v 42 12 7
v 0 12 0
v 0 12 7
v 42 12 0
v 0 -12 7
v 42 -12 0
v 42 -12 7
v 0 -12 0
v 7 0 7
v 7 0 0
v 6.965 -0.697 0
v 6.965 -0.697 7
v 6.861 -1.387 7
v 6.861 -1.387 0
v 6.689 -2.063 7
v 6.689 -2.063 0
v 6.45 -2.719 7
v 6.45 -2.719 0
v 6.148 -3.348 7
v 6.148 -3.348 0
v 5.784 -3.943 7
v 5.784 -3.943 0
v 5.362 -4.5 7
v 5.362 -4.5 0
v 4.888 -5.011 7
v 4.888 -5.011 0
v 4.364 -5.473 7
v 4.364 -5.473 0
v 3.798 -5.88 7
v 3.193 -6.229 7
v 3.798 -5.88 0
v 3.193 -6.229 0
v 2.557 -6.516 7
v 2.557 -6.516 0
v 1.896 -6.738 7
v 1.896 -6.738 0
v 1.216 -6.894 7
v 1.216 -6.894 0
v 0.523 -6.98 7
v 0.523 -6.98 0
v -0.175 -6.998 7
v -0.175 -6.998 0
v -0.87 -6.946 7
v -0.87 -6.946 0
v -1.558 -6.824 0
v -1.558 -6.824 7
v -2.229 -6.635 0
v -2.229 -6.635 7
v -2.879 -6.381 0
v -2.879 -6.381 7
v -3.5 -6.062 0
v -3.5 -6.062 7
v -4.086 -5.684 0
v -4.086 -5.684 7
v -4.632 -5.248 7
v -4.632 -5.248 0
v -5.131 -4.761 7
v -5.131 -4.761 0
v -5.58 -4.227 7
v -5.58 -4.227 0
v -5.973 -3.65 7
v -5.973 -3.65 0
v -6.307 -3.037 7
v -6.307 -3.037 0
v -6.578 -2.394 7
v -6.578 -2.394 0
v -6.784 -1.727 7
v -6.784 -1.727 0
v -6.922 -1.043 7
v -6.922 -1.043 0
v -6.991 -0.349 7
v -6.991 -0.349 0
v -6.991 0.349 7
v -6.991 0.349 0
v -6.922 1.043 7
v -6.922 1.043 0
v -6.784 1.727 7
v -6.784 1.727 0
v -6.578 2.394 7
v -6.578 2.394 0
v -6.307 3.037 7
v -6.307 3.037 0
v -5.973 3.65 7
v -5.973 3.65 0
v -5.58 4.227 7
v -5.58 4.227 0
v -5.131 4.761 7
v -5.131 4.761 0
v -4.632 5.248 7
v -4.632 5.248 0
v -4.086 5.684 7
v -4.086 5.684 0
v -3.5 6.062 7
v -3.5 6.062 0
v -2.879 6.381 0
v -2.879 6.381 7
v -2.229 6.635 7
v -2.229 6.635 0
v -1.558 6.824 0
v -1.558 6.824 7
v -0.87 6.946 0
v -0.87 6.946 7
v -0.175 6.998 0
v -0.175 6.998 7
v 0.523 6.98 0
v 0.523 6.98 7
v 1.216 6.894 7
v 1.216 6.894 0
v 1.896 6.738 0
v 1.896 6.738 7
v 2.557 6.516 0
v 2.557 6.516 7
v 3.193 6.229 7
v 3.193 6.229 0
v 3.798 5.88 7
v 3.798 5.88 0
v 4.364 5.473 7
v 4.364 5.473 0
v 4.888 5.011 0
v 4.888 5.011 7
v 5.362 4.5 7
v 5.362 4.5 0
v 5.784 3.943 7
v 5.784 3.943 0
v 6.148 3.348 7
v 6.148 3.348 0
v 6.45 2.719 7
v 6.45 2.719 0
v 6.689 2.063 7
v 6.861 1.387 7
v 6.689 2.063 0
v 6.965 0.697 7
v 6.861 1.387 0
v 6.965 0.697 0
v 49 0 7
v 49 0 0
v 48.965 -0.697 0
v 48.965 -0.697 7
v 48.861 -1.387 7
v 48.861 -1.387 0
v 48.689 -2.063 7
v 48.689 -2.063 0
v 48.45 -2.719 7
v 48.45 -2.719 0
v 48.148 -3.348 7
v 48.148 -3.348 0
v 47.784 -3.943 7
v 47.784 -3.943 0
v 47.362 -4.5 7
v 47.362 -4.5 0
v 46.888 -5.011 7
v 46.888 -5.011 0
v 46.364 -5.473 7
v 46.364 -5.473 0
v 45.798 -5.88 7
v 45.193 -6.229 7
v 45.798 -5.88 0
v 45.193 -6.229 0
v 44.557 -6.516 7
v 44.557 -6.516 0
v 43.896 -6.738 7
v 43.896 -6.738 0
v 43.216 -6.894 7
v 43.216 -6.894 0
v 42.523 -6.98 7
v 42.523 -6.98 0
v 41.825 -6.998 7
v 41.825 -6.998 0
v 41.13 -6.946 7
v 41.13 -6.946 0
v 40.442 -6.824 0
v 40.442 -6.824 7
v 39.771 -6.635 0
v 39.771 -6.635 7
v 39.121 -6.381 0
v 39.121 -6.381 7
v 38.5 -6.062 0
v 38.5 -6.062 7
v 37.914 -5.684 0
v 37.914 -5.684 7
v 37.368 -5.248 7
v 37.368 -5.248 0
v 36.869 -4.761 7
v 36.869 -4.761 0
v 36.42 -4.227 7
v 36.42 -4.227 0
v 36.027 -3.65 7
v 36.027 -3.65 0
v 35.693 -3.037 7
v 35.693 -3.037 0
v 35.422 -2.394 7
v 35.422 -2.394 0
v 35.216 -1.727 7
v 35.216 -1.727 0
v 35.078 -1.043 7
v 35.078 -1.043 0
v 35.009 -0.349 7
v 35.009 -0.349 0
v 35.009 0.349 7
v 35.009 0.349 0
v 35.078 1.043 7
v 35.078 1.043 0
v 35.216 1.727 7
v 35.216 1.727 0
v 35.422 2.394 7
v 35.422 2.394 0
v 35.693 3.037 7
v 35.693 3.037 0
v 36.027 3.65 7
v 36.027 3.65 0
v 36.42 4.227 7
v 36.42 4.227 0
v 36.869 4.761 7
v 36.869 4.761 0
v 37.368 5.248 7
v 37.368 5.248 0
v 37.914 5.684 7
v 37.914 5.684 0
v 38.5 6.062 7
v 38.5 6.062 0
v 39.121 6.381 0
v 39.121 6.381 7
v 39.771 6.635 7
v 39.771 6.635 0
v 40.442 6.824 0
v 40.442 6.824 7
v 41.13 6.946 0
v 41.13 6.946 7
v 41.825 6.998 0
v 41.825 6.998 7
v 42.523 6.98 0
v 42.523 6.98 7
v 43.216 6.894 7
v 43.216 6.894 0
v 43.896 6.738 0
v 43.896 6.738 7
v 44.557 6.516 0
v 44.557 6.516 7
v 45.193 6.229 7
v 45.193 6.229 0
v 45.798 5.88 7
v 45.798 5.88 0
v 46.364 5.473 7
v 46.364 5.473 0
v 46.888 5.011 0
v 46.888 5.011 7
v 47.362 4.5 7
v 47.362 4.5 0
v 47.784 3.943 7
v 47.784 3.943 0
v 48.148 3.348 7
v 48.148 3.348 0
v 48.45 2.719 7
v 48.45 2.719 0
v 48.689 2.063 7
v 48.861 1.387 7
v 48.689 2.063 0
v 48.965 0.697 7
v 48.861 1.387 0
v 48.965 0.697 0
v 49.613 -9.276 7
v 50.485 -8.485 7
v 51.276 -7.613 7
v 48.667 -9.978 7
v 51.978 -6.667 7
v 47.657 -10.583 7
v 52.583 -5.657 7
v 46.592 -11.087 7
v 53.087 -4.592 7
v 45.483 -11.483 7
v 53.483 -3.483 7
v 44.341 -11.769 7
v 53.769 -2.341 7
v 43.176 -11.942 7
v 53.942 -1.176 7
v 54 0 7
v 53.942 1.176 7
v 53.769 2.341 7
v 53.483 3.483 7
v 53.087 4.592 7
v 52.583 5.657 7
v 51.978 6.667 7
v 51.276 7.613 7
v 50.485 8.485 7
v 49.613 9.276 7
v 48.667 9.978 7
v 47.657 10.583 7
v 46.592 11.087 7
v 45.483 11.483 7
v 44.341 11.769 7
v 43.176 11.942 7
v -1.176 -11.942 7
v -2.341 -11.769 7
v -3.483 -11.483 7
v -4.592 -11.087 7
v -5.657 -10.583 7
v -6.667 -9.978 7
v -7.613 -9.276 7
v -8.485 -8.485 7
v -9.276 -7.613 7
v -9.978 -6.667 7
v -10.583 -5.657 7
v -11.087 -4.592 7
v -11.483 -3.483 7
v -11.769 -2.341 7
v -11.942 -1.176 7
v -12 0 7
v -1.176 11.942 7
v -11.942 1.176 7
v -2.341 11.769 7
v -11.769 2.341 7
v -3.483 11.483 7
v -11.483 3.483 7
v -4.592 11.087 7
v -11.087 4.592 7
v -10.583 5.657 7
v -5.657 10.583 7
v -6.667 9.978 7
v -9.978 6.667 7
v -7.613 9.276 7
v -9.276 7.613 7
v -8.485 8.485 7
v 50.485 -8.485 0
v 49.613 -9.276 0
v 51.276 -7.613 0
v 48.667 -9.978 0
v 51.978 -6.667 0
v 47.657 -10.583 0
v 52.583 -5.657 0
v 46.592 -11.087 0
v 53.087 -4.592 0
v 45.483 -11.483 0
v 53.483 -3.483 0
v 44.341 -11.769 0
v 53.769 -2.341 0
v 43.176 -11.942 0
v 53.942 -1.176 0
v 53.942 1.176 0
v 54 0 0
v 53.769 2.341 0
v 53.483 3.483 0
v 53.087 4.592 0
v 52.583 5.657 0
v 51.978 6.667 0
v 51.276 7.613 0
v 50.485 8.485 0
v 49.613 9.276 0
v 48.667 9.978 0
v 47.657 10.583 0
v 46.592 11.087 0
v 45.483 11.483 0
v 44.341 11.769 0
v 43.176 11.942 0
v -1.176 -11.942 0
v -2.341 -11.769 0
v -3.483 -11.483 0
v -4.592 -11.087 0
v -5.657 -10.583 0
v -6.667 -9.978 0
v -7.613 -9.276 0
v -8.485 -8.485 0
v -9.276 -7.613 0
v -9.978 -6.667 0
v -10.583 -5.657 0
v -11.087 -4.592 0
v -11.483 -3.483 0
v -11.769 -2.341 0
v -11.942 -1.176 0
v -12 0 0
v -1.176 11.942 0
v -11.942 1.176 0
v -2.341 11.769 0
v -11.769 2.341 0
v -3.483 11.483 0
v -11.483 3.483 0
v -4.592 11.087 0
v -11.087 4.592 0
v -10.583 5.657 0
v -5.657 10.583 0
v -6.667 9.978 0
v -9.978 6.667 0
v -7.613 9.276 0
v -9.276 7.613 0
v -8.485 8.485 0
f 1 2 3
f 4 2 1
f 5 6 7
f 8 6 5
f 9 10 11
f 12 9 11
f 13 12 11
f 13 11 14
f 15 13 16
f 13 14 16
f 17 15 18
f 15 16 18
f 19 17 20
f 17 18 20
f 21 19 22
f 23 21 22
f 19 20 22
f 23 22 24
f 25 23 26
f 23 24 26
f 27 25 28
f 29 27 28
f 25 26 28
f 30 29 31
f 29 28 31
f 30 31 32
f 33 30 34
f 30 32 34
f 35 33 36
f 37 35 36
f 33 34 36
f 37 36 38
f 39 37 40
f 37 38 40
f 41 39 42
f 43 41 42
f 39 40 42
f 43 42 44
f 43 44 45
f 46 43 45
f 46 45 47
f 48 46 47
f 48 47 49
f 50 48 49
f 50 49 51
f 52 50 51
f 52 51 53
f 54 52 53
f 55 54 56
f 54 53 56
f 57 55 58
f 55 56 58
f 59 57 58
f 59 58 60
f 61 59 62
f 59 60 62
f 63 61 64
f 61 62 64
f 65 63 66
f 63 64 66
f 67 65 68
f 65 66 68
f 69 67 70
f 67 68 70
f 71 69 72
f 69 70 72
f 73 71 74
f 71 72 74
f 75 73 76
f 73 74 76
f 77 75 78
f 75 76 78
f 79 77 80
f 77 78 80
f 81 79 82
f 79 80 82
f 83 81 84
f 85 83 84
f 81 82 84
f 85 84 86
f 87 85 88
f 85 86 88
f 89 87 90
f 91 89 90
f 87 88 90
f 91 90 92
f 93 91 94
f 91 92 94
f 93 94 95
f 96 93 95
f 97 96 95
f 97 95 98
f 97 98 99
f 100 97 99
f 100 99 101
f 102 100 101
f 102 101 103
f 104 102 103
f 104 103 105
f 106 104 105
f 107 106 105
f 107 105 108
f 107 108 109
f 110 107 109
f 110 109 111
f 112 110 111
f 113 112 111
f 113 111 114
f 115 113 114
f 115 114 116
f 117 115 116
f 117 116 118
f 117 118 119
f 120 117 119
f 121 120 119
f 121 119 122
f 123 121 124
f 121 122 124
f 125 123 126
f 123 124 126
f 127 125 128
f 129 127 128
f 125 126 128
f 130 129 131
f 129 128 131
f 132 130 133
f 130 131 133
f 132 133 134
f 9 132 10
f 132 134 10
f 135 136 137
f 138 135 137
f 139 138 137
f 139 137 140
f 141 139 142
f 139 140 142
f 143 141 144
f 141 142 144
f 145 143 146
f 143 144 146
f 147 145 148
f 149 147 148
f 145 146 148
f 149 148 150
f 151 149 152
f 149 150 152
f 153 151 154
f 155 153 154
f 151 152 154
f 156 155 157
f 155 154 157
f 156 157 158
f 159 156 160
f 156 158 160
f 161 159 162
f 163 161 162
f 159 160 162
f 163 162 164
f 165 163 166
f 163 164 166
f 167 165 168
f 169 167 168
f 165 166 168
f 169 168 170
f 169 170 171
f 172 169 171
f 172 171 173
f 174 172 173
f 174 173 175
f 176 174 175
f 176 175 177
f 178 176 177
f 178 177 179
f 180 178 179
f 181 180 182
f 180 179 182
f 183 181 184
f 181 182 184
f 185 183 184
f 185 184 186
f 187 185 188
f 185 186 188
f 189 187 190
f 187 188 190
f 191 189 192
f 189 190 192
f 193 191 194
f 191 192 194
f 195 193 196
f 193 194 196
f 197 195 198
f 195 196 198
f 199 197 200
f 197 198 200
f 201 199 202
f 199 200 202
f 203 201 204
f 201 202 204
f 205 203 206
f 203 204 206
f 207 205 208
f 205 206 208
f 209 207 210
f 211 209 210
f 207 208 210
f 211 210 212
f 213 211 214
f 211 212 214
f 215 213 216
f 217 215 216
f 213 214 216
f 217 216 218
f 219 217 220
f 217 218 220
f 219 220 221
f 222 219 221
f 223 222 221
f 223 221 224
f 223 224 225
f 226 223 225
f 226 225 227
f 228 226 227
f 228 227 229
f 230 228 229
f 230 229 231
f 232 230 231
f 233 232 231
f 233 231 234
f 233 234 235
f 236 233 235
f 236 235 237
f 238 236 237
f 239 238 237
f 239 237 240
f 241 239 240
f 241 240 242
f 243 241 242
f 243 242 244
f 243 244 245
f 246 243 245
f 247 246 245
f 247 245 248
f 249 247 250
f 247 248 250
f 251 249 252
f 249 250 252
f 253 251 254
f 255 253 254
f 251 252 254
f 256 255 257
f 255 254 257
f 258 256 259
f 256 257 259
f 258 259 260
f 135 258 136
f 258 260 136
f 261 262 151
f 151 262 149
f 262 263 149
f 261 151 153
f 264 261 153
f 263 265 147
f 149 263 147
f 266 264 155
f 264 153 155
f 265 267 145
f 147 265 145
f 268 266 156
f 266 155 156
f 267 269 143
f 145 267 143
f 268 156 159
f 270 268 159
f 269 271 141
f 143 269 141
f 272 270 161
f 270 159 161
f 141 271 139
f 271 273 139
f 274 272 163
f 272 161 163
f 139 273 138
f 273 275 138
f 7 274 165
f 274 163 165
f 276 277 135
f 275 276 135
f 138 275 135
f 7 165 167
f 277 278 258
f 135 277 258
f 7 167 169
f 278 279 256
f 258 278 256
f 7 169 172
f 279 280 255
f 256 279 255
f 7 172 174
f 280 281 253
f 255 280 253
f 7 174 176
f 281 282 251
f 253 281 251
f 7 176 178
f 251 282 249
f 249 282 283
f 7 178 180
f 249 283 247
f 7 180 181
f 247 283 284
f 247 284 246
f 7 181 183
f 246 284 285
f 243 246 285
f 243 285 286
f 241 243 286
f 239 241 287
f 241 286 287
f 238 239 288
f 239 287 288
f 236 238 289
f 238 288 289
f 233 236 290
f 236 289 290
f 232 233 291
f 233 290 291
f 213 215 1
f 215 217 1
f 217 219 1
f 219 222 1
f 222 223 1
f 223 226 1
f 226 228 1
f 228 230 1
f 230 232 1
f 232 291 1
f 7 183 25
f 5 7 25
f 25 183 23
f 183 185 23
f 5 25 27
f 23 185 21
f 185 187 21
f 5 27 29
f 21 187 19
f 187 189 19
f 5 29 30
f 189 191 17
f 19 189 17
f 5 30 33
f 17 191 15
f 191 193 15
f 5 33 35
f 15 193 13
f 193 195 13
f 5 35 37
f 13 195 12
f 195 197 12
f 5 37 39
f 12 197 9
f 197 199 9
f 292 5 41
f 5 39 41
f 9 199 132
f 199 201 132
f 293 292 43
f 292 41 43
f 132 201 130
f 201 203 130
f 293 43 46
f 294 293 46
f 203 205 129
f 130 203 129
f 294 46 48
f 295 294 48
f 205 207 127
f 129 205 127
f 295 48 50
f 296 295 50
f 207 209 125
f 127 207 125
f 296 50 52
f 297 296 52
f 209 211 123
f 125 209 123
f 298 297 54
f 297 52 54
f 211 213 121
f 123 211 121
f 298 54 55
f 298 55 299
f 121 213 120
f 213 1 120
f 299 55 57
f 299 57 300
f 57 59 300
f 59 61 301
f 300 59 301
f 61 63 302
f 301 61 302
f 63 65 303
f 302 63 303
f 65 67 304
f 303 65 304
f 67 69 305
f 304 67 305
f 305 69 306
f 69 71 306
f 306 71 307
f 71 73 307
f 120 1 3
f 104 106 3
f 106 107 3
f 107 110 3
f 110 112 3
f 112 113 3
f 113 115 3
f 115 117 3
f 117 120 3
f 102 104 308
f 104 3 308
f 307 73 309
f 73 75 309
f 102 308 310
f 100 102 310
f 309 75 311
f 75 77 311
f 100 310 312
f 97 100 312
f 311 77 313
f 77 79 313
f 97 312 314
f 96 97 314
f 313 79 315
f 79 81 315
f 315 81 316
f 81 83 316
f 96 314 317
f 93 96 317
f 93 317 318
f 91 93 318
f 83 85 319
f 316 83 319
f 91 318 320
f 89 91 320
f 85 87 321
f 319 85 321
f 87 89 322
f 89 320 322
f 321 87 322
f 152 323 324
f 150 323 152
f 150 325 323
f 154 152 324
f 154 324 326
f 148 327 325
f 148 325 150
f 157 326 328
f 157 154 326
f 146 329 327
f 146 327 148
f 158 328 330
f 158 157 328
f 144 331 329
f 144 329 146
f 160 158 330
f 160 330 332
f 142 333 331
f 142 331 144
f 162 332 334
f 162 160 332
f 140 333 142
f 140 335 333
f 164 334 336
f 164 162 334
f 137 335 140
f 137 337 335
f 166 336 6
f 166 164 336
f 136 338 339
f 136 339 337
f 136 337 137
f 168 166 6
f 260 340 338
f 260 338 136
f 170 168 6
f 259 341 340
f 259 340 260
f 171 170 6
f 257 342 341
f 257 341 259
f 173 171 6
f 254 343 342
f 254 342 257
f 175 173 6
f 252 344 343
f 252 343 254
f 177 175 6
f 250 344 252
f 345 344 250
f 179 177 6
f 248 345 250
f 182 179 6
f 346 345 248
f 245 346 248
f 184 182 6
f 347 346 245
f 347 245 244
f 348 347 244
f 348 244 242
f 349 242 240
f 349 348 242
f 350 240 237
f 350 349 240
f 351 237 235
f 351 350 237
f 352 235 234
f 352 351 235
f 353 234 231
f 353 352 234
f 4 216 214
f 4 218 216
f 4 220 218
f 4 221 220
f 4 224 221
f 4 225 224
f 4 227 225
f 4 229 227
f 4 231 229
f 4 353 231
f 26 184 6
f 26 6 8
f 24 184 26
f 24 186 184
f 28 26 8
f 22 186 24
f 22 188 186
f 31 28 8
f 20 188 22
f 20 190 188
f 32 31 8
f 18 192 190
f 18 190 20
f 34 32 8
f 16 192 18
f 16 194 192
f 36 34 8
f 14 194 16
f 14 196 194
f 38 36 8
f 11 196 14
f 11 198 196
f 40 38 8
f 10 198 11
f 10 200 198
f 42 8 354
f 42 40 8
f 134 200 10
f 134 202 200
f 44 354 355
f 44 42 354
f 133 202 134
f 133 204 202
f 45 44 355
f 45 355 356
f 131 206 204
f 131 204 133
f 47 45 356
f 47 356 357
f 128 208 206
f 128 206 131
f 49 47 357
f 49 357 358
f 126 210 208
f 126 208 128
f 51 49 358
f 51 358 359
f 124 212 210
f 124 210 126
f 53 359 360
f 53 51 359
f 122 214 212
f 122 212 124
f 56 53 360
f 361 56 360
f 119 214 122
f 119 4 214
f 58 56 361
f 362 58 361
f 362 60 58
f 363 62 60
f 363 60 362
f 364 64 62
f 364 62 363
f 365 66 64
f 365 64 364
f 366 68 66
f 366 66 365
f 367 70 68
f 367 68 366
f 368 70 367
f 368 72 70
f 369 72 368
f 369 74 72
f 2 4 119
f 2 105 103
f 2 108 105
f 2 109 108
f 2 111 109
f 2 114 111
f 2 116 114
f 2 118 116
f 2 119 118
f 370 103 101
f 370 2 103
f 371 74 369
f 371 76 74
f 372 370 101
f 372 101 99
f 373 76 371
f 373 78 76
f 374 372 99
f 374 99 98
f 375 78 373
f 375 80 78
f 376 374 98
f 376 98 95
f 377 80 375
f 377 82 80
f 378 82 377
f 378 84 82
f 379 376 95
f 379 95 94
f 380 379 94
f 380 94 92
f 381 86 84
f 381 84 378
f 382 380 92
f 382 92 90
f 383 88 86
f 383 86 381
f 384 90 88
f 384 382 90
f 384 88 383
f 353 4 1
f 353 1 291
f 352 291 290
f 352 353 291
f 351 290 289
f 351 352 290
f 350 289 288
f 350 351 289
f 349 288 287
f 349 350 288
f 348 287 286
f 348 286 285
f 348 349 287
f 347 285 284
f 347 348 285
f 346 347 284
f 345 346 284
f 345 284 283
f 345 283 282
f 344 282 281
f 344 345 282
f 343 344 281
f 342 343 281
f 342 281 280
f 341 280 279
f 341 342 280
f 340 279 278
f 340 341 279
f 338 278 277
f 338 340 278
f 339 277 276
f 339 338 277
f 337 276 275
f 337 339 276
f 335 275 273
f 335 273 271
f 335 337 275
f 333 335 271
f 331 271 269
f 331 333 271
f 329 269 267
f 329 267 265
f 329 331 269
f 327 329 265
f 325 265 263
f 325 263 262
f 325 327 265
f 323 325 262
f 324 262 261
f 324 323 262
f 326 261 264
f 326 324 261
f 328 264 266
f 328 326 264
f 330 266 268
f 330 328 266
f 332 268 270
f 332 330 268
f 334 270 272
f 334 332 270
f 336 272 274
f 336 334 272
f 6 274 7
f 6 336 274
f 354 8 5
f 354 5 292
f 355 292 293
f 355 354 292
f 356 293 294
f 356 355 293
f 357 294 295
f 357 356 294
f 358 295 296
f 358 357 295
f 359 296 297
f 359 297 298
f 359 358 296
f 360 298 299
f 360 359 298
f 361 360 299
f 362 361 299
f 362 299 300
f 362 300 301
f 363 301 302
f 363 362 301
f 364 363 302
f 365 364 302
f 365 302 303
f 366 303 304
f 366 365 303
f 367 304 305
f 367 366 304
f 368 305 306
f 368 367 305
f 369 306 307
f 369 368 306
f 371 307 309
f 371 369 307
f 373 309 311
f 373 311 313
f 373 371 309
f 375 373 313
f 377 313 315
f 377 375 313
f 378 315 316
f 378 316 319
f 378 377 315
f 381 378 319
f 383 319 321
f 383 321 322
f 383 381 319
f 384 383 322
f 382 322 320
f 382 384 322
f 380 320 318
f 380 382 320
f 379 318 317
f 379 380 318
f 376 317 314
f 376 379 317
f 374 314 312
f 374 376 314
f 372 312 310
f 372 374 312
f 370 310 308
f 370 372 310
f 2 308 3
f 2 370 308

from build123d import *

# Parameters (mm, degrees)
ESQUISSE1_R      = 7
EXTRUSION1_DEPTH = 7


with BuildPart() as part:
    # Esquisse1 → Extrusion1 (new body)
    with BuildSketch(Plane(origin=(0, 0, 0), x_dir=(-1, 0, 0), z_dir=(0, 0, -1))):
        with BuildLine():
            Line((0, 12), (-42, 12))
            ThreePointArc((-42, 12), (-54, 0), (-42, -12))
            Line((-42, -12), (0, -12))
            ThreePointArc((0, -12), (12, 0), (0, 12))
        make_face()
        with Locations(Location((-42, 0, 0), (0, 0, 180))):
            Circle(ESQUISSE1_R, mode=Mode.SUBTRACT)
        with Locations(Location((0, 0, 0), (0, 0, 180))):
            Circle(ESQUISSE1_R, mode=Mode.SUBTRACT)
    extrude(amount=-EXTRUSION1_DEPTH)


solid = part.part
